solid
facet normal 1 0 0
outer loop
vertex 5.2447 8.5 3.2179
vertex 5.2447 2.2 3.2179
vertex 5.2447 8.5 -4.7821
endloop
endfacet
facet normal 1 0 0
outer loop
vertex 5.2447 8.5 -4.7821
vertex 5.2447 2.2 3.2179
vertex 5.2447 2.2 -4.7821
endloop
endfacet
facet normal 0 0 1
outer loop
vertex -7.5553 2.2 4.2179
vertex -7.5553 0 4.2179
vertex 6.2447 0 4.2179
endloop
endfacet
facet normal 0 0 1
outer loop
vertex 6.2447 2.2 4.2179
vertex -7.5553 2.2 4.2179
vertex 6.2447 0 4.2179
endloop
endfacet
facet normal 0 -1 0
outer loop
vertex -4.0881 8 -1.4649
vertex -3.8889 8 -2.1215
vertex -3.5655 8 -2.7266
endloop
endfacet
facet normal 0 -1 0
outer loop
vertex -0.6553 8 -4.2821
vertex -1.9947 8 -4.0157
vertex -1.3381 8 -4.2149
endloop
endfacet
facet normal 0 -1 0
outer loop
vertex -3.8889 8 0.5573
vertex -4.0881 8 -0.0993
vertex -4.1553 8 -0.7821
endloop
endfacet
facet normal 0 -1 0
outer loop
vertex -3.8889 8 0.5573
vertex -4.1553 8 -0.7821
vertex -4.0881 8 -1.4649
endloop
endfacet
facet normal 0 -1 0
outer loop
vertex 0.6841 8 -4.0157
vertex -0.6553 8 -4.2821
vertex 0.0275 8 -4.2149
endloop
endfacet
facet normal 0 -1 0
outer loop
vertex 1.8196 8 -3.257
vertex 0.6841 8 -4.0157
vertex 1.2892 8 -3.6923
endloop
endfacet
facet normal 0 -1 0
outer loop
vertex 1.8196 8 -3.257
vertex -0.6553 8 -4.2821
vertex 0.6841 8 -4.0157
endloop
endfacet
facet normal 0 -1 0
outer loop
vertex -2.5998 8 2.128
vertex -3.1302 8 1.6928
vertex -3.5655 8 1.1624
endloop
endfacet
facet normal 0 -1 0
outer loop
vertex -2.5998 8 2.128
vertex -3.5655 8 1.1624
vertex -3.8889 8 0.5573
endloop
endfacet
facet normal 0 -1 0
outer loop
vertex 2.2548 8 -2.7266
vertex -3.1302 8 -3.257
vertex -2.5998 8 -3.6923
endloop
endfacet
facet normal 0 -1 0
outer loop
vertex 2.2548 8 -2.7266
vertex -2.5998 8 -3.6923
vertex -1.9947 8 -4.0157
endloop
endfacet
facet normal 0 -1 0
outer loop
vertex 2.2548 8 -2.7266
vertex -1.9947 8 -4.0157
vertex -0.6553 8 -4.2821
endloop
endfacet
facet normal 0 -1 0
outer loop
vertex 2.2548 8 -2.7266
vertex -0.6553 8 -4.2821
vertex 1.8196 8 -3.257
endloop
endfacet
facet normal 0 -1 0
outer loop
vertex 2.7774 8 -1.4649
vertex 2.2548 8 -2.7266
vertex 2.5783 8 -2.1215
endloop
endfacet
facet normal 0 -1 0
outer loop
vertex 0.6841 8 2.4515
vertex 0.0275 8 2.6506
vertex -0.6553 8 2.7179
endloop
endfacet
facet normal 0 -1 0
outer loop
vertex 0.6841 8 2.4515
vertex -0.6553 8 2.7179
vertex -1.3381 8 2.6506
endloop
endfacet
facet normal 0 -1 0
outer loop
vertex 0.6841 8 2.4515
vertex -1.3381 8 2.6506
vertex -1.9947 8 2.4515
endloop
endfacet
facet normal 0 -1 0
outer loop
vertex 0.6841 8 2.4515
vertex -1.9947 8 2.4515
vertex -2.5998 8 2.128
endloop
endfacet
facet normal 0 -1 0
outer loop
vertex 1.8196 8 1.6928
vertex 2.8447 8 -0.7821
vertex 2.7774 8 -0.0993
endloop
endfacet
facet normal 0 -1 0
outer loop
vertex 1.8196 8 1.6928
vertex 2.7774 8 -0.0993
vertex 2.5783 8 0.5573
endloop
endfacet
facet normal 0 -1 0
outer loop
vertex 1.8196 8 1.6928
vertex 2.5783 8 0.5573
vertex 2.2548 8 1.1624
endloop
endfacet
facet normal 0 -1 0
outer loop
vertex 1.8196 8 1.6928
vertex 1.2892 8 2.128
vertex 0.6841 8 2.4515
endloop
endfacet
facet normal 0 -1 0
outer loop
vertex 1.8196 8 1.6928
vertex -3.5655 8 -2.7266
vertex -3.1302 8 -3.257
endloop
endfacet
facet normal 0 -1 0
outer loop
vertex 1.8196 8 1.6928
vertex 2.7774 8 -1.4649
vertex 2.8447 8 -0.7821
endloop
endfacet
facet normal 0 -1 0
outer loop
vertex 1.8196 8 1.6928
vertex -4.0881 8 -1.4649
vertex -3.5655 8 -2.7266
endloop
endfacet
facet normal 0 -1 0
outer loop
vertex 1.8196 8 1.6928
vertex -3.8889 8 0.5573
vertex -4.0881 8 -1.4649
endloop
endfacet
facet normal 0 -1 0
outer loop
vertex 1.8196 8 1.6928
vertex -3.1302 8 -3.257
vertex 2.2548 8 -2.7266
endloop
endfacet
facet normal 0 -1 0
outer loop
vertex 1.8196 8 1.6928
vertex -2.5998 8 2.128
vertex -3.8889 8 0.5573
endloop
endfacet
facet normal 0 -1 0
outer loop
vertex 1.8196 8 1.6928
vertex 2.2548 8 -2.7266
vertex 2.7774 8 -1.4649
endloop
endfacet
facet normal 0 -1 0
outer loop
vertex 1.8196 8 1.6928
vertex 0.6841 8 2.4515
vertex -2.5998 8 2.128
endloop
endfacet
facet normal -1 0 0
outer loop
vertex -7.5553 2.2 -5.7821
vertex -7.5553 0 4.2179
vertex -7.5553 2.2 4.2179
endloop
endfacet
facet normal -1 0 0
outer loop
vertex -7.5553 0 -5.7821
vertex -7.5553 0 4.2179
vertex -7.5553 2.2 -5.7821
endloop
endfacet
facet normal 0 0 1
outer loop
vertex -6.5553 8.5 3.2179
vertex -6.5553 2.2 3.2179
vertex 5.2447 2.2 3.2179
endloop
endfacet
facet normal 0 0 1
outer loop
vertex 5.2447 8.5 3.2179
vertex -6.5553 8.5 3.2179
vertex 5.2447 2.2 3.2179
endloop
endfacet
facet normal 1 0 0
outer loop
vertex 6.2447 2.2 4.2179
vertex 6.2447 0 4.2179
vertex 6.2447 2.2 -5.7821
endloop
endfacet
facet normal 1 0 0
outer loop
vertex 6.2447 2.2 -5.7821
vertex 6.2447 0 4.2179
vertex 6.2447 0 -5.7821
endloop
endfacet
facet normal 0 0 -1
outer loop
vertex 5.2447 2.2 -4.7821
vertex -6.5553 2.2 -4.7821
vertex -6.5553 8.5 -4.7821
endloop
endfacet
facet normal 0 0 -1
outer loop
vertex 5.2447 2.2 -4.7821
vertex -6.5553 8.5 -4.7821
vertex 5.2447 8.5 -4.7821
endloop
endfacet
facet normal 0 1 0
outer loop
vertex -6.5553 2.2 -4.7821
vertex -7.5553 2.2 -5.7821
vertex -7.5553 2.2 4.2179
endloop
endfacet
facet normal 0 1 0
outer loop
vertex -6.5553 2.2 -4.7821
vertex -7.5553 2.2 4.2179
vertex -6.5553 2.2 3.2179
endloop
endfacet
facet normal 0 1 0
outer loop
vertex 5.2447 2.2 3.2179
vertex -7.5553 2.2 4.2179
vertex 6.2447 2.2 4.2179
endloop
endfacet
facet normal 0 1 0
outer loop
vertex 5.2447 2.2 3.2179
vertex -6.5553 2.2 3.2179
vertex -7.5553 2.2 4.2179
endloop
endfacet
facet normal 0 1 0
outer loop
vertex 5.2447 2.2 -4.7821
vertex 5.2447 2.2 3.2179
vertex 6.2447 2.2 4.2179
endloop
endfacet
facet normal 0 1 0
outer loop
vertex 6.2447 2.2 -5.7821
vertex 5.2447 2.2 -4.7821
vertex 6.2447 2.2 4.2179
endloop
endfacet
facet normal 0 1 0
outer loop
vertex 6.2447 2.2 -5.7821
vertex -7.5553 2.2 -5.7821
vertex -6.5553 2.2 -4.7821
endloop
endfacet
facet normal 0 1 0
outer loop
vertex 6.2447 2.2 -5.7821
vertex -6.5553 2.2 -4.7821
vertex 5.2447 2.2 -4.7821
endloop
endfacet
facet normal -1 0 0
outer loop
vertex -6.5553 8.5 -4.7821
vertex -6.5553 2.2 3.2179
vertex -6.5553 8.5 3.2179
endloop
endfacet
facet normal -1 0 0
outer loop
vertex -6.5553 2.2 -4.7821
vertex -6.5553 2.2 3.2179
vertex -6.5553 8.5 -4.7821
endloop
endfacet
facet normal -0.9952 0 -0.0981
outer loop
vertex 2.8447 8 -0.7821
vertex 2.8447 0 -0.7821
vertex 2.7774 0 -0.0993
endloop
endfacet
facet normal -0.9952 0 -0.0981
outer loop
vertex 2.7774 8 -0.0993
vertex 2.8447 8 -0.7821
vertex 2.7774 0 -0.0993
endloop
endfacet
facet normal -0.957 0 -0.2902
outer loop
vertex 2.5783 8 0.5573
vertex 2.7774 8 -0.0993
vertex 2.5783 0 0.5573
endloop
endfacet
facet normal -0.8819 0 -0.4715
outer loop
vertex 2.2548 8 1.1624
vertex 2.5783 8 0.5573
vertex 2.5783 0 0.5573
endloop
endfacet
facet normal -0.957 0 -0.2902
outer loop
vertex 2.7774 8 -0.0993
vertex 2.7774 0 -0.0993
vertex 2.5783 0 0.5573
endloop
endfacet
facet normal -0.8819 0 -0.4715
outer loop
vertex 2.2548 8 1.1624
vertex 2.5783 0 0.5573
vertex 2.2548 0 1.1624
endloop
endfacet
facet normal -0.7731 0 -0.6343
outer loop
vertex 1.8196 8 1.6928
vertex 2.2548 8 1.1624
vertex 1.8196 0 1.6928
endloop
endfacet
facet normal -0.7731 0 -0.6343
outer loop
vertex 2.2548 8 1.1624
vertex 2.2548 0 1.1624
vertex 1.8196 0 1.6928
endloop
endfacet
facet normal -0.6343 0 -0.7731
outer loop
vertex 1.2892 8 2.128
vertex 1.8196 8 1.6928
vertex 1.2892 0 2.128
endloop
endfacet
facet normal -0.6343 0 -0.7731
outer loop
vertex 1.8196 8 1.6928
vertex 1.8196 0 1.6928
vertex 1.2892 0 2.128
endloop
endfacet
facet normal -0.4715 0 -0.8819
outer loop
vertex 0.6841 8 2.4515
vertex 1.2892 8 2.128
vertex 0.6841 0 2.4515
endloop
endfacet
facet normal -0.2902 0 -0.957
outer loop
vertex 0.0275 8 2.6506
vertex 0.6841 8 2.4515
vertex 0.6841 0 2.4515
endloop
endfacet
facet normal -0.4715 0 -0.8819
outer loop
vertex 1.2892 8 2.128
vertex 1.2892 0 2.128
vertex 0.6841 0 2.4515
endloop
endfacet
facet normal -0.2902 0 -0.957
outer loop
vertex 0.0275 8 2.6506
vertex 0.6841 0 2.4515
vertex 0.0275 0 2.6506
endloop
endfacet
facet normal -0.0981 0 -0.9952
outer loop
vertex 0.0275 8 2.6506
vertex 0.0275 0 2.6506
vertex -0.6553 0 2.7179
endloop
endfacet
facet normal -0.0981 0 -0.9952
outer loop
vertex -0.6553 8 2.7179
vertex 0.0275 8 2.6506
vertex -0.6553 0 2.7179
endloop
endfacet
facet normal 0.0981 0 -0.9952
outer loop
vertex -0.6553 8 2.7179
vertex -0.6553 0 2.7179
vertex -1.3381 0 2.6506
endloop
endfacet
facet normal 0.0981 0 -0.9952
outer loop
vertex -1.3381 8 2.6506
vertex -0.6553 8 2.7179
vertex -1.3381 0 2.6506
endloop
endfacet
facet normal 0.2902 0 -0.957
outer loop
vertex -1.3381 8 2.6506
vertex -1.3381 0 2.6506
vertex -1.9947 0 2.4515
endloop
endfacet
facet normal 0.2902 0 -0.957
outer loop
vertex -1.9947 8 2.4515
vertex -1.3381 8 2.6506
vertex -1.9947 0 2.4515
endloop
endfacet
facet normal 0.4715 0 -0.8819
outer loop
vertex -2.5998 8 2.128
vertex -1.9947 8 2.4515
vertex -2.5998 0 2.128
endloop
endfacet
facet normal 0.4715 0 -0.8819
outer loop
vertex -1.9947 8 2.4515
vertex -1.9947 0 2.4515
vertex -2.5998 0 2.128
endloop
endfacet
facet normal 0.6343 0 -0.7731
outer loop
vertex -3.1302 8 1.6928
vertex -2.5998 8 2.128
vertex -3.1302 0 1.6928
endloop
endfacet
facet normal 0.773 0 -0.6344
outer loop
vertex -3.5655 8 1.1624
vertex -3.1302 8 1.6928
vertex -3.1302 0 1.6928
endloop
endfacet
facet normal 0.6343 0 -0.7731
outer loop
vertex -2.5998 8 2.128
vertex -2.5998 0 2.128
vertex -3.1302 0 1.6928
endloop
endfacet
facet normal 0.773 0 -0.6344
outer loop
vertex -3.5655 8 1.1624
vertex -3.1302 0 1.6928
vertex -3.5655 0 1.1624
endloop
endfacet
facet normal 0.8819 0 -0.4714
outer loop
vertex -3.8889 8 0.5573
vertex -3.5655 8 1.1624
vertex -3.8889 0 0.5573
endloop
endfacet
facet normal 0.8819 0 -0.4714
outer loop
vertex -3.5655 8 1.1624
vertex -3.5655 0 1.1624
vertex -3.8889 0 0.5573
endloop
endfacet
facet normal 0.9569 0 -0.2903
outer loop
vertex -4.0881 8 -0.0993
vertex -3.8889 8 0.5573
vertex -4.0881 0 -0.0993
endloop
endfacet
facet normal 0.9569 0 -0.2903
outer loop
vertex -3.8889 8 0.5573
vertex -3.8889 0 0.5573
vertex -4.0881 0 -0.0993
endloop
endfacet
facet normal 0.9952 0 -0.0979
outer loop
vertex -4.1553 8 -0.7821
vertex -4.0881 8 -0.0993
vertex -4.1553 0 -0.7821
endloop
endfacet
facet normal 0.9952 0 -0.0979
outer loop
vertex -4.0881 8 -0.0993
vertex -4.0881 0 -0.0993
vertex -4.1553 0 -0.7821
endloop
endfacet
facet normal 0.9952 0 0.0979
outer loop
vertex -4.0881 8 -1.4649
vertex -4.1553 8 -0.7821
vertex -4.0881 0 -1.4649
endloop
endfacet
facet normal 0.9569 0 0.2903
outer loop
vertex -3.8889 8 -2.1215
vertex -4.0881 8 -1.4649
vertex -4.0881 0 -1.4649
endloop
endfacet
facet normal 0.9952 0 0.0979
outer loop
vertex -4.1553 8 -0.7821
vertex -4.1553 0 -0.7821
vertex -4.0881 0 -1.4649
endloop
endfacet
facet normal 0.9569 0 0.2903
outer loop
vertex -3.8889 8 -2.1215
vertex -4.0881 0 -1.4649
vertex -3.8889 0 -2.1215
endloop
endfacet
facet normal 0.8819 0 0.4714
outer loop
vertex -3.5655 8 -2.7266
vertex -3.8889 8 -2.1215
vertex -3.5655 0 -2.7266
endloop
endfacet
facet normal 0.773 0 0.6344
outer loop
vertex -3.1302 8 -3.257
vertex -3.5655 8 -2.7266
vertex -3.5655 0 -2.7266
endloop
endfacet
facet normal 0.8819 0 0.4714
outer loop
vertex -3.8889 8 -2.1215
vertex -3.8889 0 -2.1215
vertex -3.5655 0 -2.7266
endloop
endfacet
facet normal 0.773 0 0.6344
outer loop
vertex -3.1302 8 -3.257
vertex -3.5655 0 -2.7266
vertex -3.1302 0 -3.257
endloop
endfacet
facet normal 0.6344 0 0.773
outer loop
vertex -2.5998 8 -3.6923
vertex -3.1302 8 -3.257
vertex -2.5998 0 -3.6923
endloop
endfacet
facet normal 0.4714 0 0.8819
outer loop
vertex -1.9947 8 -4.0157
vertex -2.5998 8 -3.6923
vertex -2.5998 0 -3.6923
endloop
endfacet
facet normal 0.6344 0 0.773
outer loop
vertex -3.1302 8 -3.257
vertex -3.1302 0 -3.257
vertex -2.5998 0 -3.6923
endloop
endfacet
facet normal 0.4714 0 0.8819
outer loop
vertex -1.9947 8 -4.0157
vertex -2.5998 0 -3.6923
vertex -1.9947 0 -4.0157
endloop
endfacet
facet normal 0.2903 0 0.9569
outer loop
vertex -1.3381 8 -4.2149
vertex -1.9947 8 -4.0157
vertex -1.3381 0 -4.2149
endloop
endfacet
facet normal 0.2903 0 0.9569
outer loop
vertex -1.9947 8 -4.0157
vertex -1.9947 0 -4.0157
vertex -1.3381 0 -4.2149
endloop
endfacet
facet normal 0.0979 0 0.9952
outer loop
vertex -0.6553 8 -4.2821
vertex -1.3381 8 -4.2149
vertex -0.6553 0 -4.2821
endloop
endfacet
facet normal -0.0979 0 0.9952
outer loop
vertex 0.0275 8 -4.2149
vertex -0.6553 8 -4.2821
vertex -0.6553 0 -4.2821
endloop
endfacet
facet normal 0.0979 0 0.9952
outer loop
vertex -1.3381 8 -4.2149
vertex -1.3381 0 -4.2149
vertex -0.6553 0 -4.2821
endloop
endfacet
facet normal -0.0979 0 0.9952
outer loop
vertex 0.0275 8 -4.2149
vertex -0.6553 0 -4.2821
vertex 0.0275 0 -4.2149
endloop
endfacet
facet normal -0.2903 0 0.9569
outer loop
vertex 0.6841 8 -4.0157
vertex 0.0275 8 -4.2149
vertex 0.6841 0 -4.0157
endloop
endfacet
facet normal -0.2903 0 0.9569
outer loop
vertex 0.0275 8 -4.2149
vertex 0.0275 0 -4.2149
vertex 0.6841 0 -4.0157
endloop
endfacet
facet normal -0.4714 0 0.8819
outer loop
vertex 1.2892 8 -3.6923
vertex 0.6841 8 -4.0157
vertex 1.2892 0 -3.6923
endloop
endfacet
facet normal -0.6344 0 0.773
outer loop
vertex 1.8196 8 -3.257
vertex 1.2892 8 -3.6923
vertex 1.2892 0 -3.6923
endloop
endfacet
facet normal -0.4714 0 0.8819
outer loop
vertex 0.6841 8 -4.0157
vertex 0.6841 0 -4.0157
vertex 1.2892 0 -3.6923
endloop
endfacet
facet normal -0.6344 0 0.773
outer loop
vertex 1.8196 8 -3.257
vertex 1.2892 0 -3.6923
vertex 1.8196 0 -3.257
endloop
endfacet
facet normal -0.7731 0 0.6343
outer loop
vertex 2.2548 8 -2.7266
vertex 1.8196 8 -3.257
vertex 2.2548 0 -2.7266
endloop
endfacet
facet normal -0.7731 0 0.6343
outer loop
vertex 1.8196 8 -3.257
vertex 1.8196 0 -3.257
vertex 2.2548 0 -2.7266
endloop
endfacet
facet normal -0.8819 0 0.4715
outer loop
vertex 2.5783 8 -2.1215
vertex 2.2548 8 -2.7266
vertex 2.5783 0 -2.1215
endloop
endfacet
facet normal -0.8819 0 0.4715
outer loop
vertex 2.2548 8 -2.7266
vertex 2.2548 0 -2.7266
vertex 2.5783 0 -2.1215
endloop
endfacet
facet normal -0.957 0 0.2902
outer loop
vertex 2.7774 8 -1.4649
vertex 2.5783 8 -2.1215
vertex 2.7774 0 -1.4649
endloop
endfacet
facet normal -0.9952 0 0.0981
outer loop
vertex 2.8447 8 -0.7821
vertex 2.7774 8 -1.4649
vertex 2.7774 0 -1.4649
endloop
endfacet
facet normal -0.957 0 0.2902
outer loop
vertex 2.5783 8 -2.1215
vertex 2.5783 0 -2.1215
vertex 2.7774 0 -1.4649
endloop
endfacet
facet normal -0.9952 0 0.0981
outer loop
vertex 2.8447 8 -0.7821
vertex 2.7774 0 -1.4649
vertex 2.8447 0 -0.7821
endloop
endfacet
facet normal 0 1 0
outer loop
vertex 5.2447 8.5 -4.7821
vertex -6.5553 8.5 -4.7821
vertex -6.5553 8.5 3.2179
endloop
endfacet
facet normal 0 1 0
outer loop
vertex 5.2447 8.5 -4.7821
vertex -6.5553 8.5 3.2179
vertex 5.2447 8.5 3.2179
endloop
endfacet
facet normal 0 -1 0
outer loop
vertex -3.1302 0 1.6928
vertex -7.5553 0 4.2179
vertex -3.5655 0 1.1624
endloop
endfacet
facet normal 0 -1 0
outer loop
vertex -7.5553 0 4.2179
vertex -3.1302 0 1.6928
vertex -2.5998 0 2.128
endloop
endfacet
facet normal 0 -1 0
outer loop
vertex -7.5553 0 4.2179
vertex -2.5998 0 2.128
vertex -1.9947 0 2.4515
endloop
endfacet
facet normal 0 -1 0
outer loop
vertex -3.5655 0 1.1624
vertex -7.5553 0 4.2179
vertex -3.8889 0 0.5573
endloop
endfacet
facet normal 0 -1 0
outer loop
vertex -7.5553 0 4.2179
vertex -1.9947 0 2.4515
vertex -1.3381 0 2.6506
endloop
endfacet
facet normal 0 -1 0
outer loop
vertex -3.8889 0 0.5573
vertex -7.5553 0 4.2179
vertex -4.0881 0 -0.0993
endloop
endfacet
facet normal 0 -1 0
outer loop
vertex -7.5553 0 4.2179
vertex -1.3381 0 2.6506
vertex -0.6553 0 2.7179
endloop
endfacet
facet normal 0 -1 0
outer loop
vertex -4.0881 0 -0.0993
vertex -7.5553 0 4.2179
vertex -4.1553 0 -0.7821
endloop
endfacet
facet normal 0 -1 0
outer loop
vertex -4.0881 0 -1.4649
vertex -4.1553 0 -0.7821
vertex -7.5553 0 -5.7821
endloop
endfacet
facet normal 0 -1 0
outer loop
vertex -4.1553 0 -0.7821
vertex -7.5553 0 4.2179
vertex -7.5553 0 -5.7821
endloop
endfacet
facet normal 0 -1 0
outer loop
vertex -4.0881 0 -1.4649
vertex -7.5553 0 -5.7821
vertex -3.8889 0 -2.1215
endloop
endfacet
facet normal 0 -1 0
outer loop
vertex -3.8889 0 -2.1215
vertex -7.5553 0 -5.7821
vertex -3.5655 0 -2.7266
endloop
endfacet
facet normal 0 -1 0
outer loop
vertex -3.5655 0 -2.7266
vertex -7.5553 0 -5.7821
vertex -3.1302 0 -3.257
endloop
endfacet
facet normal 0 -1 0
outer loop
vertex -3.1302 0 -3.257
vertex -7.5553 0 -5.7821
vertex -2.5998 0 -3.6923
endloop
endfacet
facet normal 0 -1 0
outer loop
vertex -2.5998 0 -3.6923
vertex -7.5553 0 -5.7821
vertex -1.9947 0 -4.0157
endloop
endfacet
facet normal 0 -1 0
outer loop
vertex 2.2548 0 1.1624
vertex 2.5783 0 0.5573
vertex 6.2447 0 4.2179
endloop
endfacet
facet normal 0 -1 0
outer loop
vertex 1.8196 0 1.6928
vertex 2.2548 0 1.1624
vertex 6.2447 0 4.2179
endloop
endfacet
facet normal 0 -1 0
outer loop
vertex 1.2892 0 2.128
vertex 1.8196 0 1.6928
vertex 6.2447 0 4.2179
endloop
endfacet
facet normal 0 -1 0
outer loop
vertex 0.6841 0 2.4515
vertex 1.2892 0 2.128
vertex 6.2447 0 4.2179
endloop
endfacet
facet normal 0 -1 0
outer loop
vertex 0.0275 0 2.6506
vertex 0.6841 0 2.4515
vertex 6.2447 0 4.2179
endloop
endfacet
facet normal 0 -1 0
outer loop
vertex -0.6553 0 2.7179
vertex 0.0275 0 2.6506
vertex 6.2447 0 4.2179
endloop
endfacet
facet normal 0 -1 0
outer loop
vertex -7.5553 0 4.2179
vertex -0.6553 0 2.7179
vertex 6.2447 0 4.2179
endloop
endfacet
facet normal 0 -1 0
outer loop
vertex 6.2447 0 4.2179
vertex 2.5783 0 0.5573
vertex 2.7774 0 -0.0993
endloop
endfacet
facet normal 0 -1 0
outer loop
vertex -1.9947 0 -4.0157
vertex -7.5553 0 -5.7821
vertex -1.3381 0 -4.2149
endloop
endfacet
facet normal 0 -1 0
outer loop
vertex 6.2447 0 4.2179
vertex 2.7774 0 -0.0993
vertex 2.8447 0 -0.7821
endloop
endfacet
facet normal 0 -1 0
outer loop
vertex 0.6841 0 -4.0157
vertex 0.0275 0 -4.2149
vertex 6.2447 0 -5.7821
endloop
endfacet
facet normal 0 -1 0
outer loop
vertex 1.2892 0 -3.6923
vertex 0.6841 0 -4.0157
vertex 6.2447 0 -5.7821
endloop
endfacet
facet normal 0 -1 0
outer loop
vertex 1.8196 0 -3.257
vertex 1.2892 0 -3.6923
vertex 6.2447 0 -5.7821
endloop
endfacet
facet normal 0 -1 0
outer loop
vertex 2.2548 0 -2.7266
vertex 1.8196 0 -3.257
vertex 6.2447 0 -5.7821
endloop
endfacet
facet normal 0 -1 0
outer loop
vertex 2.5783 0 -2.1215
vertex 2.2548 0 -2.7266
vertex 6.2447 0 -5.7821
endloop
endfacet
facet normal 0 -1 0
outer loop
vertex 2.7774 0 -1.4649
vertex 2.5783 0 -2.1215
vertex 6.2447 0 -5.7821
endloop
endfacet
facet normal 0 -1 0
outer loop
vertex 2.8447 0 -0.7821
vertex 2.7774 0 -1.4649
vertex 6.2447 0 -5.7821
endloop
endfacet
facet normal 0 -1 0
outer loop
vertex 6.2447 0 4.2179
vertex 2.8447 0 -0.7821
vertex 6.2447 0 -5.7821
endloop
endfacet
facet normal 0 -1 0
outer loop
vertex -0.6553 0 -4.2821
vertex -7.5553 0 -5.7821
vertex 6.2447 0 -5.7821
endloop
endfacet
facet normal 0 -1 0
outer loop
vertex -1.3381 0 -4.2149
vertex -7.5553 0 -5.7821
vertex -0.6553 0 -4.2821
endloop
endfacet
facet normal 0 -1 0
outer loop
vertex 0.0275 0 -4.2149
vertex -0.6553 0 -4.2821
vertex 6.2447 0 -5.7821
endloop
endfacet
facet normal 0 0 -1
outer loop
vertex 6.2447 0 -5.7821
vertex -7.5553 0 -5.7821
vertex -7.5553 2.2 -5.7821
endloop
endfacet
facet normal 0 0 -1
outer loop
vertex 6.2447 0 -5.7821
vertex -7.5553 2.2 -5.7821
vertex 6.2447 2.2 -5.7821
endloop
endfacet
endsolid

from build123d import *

# Parameters (mm, degrees)
CROQUIS2_W              = 13.8
CROQUIS2_H              = 10
SALIENTE_EXTRUIR1_DEPTH = 2.2
CROQUIS3_W              = 11.8
CROQUIS3_H              = 8
SALIENTE_EXTRUIR2_DEPTH = 6.3
CROQUIS4_R              = 3.5
CORTAR_EXTRUIR1_DEPTH   = 8


with BuildPart() as part:
    # Croquis2 → Saliente-Extruir1 (new body)
    with BuildSketch(Plane(origin=(0, 0, 0), x_dir=(1, 0, 0), z_dir=(0, 1, 0))):
        with Locations((-0.655307263, 0.782122905)):
            Rectangle(CROQUIS2_W, CROQUIS2_H)
    extrude(amount=SALIENTE_EXTRUIR1_DEPTH)

    # Croquis3 → Saliente-Extruir2 (add)
    with BuildSketch(Plane(origin=(0, 2.2, 0), x_dir=(1, 0, 0), z_dir=(0, 1, 0))):
        with Locations((-0.655307263, 0.782122905)):
            Rectangle(CROQUIS3_W, CROQUIS3_H)
    extrude(amount=SALIENTE_EXTRUIR2_DEPTH)

    # Croquis4 → Cortar-Extruir1 (cut)
    with BuildSketch(Plane.XZ):
        with Locations((-0.655307263, -0.782122905)):
            Circle(CROQUIS4_R)
    extrude(amount=-CORTAR_EXTRUIR1_DEPTH, mode=Mode.SUBTRACT)


solid = part.part
